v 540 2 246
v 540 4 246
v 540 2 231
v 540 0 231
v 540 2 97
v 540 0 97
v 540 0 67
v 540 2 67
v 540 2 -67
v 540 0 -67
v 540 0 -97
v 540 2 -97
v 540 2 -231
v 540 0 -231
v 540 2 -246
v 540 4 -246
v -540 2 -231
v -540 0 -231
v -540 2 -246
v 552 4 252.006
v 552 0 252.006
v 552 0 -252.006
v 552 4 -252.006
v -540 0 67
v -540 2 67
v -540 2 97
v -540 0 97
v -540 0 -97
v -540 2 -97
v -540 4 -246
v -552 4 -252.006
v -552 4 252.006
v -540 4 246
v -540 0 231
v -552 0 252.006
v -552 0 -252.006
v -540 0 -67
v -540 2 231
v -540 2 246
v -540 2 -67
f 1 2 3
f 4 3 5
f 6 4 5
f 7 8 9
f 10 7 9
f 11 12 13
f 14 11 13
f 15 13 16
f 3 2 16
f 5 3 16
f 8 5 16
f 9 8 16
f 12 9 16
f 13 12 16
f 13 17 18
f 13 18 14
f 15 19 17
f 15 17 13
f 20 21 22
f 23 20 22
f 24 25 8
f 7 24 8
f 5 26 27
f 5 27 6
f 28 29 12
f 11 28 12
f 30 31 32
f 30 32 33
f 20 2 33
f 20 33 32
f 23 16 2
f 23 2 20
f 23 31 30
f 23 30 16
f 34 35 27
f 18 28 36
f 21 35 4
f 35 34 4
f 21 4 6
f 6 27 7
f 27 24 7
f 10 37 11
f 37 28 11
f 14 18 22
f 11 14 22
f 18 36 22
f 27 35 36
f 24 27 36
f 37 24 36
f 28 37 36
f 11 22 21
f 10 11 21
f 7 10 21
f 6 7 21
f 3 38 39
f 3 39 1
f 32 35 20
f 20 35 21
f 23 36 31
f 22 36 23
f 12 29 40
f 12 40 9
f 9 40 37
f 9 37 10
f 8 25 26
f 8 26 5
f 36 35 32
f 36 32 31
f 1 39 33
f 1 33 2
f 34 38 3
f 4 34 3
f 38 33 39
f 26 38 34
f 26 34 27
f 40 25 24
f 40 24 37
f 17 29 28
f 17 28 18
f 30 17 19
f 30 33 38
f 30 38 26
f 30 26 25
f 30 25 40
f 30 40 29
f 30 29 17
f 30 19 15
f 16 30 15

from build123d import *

# Parameters (mm, degrees)
SKETCH1_W           = 1080
SKETCH1_H           = 492
BOSS_EXTRUDE1_DEPTH = 2
SKETCH4_W           = 1104
SKETCH4_H           = 504.01209321
SKETCH4_W_2         = 1080
SKETCH4_H_2         = 492
BOSS_EXTRUDE3_DEPTH = 4
SKETCH5_W           = 1080
SKETCH5_H           = 134
CUT_EXTRUDE2_DEPTH  = 4
LPATTERN2_COUNT     = 3
LPATTERN2_PITCH     = 164


with BuildPart() as part:
    # Sketch1 → Boss-Extrude1 (new body)
    with BuildSketch(Plane(origin=(0, 0, 0), x_dir=(1, 0, 0), z_dir=(0, 1, 0))):
        Rectangle(SKETCH1_W, SKETCH1_H)
    extrude(amount=BOSS_EXTRUDE1_DEPTH)

    # Sketch4 → Boss-Extrude3 (add)
    with BuildSketch(Plane(origin=(0, 0, 0), x_dir=(1, 0, 0), z_dir=(0, 1, 0))):
        Rectangle(SKETCH4_W, SKETCH4_H)
        Rectangle(SKETCH4_W_2, SKETCH4_H_2, mode=Mode.SUBTRACT)
    extrude(amount=BOSS_EXTRUDE3_DEPTH)

    # Sketch5 → Cut-Extrude2 (cut)
    with BuildSketch(Plane(origin=(0, 2, 0), x_dir=(1, 0, 0), z_dir=(0, 1, 0))):
        with Locations((0, 164)):
            Rectangle(SKETCH5_W, SKETCH5_H)
    cut_extrude2 = extrude(amount=-CUT_EXTRUDE2_DEPTH, mode=Mode.SUBTRACT)

    # LPattern2: Cut-Extrude2 ×3
    with Locations(*[(0, 0, i * LPATTERN2_PITCH) for i in range(1, LPATTERN2_COUNT)]):
        add(cut_extrude2, mode=Mode.SUBTRACT)


solid = part.part
